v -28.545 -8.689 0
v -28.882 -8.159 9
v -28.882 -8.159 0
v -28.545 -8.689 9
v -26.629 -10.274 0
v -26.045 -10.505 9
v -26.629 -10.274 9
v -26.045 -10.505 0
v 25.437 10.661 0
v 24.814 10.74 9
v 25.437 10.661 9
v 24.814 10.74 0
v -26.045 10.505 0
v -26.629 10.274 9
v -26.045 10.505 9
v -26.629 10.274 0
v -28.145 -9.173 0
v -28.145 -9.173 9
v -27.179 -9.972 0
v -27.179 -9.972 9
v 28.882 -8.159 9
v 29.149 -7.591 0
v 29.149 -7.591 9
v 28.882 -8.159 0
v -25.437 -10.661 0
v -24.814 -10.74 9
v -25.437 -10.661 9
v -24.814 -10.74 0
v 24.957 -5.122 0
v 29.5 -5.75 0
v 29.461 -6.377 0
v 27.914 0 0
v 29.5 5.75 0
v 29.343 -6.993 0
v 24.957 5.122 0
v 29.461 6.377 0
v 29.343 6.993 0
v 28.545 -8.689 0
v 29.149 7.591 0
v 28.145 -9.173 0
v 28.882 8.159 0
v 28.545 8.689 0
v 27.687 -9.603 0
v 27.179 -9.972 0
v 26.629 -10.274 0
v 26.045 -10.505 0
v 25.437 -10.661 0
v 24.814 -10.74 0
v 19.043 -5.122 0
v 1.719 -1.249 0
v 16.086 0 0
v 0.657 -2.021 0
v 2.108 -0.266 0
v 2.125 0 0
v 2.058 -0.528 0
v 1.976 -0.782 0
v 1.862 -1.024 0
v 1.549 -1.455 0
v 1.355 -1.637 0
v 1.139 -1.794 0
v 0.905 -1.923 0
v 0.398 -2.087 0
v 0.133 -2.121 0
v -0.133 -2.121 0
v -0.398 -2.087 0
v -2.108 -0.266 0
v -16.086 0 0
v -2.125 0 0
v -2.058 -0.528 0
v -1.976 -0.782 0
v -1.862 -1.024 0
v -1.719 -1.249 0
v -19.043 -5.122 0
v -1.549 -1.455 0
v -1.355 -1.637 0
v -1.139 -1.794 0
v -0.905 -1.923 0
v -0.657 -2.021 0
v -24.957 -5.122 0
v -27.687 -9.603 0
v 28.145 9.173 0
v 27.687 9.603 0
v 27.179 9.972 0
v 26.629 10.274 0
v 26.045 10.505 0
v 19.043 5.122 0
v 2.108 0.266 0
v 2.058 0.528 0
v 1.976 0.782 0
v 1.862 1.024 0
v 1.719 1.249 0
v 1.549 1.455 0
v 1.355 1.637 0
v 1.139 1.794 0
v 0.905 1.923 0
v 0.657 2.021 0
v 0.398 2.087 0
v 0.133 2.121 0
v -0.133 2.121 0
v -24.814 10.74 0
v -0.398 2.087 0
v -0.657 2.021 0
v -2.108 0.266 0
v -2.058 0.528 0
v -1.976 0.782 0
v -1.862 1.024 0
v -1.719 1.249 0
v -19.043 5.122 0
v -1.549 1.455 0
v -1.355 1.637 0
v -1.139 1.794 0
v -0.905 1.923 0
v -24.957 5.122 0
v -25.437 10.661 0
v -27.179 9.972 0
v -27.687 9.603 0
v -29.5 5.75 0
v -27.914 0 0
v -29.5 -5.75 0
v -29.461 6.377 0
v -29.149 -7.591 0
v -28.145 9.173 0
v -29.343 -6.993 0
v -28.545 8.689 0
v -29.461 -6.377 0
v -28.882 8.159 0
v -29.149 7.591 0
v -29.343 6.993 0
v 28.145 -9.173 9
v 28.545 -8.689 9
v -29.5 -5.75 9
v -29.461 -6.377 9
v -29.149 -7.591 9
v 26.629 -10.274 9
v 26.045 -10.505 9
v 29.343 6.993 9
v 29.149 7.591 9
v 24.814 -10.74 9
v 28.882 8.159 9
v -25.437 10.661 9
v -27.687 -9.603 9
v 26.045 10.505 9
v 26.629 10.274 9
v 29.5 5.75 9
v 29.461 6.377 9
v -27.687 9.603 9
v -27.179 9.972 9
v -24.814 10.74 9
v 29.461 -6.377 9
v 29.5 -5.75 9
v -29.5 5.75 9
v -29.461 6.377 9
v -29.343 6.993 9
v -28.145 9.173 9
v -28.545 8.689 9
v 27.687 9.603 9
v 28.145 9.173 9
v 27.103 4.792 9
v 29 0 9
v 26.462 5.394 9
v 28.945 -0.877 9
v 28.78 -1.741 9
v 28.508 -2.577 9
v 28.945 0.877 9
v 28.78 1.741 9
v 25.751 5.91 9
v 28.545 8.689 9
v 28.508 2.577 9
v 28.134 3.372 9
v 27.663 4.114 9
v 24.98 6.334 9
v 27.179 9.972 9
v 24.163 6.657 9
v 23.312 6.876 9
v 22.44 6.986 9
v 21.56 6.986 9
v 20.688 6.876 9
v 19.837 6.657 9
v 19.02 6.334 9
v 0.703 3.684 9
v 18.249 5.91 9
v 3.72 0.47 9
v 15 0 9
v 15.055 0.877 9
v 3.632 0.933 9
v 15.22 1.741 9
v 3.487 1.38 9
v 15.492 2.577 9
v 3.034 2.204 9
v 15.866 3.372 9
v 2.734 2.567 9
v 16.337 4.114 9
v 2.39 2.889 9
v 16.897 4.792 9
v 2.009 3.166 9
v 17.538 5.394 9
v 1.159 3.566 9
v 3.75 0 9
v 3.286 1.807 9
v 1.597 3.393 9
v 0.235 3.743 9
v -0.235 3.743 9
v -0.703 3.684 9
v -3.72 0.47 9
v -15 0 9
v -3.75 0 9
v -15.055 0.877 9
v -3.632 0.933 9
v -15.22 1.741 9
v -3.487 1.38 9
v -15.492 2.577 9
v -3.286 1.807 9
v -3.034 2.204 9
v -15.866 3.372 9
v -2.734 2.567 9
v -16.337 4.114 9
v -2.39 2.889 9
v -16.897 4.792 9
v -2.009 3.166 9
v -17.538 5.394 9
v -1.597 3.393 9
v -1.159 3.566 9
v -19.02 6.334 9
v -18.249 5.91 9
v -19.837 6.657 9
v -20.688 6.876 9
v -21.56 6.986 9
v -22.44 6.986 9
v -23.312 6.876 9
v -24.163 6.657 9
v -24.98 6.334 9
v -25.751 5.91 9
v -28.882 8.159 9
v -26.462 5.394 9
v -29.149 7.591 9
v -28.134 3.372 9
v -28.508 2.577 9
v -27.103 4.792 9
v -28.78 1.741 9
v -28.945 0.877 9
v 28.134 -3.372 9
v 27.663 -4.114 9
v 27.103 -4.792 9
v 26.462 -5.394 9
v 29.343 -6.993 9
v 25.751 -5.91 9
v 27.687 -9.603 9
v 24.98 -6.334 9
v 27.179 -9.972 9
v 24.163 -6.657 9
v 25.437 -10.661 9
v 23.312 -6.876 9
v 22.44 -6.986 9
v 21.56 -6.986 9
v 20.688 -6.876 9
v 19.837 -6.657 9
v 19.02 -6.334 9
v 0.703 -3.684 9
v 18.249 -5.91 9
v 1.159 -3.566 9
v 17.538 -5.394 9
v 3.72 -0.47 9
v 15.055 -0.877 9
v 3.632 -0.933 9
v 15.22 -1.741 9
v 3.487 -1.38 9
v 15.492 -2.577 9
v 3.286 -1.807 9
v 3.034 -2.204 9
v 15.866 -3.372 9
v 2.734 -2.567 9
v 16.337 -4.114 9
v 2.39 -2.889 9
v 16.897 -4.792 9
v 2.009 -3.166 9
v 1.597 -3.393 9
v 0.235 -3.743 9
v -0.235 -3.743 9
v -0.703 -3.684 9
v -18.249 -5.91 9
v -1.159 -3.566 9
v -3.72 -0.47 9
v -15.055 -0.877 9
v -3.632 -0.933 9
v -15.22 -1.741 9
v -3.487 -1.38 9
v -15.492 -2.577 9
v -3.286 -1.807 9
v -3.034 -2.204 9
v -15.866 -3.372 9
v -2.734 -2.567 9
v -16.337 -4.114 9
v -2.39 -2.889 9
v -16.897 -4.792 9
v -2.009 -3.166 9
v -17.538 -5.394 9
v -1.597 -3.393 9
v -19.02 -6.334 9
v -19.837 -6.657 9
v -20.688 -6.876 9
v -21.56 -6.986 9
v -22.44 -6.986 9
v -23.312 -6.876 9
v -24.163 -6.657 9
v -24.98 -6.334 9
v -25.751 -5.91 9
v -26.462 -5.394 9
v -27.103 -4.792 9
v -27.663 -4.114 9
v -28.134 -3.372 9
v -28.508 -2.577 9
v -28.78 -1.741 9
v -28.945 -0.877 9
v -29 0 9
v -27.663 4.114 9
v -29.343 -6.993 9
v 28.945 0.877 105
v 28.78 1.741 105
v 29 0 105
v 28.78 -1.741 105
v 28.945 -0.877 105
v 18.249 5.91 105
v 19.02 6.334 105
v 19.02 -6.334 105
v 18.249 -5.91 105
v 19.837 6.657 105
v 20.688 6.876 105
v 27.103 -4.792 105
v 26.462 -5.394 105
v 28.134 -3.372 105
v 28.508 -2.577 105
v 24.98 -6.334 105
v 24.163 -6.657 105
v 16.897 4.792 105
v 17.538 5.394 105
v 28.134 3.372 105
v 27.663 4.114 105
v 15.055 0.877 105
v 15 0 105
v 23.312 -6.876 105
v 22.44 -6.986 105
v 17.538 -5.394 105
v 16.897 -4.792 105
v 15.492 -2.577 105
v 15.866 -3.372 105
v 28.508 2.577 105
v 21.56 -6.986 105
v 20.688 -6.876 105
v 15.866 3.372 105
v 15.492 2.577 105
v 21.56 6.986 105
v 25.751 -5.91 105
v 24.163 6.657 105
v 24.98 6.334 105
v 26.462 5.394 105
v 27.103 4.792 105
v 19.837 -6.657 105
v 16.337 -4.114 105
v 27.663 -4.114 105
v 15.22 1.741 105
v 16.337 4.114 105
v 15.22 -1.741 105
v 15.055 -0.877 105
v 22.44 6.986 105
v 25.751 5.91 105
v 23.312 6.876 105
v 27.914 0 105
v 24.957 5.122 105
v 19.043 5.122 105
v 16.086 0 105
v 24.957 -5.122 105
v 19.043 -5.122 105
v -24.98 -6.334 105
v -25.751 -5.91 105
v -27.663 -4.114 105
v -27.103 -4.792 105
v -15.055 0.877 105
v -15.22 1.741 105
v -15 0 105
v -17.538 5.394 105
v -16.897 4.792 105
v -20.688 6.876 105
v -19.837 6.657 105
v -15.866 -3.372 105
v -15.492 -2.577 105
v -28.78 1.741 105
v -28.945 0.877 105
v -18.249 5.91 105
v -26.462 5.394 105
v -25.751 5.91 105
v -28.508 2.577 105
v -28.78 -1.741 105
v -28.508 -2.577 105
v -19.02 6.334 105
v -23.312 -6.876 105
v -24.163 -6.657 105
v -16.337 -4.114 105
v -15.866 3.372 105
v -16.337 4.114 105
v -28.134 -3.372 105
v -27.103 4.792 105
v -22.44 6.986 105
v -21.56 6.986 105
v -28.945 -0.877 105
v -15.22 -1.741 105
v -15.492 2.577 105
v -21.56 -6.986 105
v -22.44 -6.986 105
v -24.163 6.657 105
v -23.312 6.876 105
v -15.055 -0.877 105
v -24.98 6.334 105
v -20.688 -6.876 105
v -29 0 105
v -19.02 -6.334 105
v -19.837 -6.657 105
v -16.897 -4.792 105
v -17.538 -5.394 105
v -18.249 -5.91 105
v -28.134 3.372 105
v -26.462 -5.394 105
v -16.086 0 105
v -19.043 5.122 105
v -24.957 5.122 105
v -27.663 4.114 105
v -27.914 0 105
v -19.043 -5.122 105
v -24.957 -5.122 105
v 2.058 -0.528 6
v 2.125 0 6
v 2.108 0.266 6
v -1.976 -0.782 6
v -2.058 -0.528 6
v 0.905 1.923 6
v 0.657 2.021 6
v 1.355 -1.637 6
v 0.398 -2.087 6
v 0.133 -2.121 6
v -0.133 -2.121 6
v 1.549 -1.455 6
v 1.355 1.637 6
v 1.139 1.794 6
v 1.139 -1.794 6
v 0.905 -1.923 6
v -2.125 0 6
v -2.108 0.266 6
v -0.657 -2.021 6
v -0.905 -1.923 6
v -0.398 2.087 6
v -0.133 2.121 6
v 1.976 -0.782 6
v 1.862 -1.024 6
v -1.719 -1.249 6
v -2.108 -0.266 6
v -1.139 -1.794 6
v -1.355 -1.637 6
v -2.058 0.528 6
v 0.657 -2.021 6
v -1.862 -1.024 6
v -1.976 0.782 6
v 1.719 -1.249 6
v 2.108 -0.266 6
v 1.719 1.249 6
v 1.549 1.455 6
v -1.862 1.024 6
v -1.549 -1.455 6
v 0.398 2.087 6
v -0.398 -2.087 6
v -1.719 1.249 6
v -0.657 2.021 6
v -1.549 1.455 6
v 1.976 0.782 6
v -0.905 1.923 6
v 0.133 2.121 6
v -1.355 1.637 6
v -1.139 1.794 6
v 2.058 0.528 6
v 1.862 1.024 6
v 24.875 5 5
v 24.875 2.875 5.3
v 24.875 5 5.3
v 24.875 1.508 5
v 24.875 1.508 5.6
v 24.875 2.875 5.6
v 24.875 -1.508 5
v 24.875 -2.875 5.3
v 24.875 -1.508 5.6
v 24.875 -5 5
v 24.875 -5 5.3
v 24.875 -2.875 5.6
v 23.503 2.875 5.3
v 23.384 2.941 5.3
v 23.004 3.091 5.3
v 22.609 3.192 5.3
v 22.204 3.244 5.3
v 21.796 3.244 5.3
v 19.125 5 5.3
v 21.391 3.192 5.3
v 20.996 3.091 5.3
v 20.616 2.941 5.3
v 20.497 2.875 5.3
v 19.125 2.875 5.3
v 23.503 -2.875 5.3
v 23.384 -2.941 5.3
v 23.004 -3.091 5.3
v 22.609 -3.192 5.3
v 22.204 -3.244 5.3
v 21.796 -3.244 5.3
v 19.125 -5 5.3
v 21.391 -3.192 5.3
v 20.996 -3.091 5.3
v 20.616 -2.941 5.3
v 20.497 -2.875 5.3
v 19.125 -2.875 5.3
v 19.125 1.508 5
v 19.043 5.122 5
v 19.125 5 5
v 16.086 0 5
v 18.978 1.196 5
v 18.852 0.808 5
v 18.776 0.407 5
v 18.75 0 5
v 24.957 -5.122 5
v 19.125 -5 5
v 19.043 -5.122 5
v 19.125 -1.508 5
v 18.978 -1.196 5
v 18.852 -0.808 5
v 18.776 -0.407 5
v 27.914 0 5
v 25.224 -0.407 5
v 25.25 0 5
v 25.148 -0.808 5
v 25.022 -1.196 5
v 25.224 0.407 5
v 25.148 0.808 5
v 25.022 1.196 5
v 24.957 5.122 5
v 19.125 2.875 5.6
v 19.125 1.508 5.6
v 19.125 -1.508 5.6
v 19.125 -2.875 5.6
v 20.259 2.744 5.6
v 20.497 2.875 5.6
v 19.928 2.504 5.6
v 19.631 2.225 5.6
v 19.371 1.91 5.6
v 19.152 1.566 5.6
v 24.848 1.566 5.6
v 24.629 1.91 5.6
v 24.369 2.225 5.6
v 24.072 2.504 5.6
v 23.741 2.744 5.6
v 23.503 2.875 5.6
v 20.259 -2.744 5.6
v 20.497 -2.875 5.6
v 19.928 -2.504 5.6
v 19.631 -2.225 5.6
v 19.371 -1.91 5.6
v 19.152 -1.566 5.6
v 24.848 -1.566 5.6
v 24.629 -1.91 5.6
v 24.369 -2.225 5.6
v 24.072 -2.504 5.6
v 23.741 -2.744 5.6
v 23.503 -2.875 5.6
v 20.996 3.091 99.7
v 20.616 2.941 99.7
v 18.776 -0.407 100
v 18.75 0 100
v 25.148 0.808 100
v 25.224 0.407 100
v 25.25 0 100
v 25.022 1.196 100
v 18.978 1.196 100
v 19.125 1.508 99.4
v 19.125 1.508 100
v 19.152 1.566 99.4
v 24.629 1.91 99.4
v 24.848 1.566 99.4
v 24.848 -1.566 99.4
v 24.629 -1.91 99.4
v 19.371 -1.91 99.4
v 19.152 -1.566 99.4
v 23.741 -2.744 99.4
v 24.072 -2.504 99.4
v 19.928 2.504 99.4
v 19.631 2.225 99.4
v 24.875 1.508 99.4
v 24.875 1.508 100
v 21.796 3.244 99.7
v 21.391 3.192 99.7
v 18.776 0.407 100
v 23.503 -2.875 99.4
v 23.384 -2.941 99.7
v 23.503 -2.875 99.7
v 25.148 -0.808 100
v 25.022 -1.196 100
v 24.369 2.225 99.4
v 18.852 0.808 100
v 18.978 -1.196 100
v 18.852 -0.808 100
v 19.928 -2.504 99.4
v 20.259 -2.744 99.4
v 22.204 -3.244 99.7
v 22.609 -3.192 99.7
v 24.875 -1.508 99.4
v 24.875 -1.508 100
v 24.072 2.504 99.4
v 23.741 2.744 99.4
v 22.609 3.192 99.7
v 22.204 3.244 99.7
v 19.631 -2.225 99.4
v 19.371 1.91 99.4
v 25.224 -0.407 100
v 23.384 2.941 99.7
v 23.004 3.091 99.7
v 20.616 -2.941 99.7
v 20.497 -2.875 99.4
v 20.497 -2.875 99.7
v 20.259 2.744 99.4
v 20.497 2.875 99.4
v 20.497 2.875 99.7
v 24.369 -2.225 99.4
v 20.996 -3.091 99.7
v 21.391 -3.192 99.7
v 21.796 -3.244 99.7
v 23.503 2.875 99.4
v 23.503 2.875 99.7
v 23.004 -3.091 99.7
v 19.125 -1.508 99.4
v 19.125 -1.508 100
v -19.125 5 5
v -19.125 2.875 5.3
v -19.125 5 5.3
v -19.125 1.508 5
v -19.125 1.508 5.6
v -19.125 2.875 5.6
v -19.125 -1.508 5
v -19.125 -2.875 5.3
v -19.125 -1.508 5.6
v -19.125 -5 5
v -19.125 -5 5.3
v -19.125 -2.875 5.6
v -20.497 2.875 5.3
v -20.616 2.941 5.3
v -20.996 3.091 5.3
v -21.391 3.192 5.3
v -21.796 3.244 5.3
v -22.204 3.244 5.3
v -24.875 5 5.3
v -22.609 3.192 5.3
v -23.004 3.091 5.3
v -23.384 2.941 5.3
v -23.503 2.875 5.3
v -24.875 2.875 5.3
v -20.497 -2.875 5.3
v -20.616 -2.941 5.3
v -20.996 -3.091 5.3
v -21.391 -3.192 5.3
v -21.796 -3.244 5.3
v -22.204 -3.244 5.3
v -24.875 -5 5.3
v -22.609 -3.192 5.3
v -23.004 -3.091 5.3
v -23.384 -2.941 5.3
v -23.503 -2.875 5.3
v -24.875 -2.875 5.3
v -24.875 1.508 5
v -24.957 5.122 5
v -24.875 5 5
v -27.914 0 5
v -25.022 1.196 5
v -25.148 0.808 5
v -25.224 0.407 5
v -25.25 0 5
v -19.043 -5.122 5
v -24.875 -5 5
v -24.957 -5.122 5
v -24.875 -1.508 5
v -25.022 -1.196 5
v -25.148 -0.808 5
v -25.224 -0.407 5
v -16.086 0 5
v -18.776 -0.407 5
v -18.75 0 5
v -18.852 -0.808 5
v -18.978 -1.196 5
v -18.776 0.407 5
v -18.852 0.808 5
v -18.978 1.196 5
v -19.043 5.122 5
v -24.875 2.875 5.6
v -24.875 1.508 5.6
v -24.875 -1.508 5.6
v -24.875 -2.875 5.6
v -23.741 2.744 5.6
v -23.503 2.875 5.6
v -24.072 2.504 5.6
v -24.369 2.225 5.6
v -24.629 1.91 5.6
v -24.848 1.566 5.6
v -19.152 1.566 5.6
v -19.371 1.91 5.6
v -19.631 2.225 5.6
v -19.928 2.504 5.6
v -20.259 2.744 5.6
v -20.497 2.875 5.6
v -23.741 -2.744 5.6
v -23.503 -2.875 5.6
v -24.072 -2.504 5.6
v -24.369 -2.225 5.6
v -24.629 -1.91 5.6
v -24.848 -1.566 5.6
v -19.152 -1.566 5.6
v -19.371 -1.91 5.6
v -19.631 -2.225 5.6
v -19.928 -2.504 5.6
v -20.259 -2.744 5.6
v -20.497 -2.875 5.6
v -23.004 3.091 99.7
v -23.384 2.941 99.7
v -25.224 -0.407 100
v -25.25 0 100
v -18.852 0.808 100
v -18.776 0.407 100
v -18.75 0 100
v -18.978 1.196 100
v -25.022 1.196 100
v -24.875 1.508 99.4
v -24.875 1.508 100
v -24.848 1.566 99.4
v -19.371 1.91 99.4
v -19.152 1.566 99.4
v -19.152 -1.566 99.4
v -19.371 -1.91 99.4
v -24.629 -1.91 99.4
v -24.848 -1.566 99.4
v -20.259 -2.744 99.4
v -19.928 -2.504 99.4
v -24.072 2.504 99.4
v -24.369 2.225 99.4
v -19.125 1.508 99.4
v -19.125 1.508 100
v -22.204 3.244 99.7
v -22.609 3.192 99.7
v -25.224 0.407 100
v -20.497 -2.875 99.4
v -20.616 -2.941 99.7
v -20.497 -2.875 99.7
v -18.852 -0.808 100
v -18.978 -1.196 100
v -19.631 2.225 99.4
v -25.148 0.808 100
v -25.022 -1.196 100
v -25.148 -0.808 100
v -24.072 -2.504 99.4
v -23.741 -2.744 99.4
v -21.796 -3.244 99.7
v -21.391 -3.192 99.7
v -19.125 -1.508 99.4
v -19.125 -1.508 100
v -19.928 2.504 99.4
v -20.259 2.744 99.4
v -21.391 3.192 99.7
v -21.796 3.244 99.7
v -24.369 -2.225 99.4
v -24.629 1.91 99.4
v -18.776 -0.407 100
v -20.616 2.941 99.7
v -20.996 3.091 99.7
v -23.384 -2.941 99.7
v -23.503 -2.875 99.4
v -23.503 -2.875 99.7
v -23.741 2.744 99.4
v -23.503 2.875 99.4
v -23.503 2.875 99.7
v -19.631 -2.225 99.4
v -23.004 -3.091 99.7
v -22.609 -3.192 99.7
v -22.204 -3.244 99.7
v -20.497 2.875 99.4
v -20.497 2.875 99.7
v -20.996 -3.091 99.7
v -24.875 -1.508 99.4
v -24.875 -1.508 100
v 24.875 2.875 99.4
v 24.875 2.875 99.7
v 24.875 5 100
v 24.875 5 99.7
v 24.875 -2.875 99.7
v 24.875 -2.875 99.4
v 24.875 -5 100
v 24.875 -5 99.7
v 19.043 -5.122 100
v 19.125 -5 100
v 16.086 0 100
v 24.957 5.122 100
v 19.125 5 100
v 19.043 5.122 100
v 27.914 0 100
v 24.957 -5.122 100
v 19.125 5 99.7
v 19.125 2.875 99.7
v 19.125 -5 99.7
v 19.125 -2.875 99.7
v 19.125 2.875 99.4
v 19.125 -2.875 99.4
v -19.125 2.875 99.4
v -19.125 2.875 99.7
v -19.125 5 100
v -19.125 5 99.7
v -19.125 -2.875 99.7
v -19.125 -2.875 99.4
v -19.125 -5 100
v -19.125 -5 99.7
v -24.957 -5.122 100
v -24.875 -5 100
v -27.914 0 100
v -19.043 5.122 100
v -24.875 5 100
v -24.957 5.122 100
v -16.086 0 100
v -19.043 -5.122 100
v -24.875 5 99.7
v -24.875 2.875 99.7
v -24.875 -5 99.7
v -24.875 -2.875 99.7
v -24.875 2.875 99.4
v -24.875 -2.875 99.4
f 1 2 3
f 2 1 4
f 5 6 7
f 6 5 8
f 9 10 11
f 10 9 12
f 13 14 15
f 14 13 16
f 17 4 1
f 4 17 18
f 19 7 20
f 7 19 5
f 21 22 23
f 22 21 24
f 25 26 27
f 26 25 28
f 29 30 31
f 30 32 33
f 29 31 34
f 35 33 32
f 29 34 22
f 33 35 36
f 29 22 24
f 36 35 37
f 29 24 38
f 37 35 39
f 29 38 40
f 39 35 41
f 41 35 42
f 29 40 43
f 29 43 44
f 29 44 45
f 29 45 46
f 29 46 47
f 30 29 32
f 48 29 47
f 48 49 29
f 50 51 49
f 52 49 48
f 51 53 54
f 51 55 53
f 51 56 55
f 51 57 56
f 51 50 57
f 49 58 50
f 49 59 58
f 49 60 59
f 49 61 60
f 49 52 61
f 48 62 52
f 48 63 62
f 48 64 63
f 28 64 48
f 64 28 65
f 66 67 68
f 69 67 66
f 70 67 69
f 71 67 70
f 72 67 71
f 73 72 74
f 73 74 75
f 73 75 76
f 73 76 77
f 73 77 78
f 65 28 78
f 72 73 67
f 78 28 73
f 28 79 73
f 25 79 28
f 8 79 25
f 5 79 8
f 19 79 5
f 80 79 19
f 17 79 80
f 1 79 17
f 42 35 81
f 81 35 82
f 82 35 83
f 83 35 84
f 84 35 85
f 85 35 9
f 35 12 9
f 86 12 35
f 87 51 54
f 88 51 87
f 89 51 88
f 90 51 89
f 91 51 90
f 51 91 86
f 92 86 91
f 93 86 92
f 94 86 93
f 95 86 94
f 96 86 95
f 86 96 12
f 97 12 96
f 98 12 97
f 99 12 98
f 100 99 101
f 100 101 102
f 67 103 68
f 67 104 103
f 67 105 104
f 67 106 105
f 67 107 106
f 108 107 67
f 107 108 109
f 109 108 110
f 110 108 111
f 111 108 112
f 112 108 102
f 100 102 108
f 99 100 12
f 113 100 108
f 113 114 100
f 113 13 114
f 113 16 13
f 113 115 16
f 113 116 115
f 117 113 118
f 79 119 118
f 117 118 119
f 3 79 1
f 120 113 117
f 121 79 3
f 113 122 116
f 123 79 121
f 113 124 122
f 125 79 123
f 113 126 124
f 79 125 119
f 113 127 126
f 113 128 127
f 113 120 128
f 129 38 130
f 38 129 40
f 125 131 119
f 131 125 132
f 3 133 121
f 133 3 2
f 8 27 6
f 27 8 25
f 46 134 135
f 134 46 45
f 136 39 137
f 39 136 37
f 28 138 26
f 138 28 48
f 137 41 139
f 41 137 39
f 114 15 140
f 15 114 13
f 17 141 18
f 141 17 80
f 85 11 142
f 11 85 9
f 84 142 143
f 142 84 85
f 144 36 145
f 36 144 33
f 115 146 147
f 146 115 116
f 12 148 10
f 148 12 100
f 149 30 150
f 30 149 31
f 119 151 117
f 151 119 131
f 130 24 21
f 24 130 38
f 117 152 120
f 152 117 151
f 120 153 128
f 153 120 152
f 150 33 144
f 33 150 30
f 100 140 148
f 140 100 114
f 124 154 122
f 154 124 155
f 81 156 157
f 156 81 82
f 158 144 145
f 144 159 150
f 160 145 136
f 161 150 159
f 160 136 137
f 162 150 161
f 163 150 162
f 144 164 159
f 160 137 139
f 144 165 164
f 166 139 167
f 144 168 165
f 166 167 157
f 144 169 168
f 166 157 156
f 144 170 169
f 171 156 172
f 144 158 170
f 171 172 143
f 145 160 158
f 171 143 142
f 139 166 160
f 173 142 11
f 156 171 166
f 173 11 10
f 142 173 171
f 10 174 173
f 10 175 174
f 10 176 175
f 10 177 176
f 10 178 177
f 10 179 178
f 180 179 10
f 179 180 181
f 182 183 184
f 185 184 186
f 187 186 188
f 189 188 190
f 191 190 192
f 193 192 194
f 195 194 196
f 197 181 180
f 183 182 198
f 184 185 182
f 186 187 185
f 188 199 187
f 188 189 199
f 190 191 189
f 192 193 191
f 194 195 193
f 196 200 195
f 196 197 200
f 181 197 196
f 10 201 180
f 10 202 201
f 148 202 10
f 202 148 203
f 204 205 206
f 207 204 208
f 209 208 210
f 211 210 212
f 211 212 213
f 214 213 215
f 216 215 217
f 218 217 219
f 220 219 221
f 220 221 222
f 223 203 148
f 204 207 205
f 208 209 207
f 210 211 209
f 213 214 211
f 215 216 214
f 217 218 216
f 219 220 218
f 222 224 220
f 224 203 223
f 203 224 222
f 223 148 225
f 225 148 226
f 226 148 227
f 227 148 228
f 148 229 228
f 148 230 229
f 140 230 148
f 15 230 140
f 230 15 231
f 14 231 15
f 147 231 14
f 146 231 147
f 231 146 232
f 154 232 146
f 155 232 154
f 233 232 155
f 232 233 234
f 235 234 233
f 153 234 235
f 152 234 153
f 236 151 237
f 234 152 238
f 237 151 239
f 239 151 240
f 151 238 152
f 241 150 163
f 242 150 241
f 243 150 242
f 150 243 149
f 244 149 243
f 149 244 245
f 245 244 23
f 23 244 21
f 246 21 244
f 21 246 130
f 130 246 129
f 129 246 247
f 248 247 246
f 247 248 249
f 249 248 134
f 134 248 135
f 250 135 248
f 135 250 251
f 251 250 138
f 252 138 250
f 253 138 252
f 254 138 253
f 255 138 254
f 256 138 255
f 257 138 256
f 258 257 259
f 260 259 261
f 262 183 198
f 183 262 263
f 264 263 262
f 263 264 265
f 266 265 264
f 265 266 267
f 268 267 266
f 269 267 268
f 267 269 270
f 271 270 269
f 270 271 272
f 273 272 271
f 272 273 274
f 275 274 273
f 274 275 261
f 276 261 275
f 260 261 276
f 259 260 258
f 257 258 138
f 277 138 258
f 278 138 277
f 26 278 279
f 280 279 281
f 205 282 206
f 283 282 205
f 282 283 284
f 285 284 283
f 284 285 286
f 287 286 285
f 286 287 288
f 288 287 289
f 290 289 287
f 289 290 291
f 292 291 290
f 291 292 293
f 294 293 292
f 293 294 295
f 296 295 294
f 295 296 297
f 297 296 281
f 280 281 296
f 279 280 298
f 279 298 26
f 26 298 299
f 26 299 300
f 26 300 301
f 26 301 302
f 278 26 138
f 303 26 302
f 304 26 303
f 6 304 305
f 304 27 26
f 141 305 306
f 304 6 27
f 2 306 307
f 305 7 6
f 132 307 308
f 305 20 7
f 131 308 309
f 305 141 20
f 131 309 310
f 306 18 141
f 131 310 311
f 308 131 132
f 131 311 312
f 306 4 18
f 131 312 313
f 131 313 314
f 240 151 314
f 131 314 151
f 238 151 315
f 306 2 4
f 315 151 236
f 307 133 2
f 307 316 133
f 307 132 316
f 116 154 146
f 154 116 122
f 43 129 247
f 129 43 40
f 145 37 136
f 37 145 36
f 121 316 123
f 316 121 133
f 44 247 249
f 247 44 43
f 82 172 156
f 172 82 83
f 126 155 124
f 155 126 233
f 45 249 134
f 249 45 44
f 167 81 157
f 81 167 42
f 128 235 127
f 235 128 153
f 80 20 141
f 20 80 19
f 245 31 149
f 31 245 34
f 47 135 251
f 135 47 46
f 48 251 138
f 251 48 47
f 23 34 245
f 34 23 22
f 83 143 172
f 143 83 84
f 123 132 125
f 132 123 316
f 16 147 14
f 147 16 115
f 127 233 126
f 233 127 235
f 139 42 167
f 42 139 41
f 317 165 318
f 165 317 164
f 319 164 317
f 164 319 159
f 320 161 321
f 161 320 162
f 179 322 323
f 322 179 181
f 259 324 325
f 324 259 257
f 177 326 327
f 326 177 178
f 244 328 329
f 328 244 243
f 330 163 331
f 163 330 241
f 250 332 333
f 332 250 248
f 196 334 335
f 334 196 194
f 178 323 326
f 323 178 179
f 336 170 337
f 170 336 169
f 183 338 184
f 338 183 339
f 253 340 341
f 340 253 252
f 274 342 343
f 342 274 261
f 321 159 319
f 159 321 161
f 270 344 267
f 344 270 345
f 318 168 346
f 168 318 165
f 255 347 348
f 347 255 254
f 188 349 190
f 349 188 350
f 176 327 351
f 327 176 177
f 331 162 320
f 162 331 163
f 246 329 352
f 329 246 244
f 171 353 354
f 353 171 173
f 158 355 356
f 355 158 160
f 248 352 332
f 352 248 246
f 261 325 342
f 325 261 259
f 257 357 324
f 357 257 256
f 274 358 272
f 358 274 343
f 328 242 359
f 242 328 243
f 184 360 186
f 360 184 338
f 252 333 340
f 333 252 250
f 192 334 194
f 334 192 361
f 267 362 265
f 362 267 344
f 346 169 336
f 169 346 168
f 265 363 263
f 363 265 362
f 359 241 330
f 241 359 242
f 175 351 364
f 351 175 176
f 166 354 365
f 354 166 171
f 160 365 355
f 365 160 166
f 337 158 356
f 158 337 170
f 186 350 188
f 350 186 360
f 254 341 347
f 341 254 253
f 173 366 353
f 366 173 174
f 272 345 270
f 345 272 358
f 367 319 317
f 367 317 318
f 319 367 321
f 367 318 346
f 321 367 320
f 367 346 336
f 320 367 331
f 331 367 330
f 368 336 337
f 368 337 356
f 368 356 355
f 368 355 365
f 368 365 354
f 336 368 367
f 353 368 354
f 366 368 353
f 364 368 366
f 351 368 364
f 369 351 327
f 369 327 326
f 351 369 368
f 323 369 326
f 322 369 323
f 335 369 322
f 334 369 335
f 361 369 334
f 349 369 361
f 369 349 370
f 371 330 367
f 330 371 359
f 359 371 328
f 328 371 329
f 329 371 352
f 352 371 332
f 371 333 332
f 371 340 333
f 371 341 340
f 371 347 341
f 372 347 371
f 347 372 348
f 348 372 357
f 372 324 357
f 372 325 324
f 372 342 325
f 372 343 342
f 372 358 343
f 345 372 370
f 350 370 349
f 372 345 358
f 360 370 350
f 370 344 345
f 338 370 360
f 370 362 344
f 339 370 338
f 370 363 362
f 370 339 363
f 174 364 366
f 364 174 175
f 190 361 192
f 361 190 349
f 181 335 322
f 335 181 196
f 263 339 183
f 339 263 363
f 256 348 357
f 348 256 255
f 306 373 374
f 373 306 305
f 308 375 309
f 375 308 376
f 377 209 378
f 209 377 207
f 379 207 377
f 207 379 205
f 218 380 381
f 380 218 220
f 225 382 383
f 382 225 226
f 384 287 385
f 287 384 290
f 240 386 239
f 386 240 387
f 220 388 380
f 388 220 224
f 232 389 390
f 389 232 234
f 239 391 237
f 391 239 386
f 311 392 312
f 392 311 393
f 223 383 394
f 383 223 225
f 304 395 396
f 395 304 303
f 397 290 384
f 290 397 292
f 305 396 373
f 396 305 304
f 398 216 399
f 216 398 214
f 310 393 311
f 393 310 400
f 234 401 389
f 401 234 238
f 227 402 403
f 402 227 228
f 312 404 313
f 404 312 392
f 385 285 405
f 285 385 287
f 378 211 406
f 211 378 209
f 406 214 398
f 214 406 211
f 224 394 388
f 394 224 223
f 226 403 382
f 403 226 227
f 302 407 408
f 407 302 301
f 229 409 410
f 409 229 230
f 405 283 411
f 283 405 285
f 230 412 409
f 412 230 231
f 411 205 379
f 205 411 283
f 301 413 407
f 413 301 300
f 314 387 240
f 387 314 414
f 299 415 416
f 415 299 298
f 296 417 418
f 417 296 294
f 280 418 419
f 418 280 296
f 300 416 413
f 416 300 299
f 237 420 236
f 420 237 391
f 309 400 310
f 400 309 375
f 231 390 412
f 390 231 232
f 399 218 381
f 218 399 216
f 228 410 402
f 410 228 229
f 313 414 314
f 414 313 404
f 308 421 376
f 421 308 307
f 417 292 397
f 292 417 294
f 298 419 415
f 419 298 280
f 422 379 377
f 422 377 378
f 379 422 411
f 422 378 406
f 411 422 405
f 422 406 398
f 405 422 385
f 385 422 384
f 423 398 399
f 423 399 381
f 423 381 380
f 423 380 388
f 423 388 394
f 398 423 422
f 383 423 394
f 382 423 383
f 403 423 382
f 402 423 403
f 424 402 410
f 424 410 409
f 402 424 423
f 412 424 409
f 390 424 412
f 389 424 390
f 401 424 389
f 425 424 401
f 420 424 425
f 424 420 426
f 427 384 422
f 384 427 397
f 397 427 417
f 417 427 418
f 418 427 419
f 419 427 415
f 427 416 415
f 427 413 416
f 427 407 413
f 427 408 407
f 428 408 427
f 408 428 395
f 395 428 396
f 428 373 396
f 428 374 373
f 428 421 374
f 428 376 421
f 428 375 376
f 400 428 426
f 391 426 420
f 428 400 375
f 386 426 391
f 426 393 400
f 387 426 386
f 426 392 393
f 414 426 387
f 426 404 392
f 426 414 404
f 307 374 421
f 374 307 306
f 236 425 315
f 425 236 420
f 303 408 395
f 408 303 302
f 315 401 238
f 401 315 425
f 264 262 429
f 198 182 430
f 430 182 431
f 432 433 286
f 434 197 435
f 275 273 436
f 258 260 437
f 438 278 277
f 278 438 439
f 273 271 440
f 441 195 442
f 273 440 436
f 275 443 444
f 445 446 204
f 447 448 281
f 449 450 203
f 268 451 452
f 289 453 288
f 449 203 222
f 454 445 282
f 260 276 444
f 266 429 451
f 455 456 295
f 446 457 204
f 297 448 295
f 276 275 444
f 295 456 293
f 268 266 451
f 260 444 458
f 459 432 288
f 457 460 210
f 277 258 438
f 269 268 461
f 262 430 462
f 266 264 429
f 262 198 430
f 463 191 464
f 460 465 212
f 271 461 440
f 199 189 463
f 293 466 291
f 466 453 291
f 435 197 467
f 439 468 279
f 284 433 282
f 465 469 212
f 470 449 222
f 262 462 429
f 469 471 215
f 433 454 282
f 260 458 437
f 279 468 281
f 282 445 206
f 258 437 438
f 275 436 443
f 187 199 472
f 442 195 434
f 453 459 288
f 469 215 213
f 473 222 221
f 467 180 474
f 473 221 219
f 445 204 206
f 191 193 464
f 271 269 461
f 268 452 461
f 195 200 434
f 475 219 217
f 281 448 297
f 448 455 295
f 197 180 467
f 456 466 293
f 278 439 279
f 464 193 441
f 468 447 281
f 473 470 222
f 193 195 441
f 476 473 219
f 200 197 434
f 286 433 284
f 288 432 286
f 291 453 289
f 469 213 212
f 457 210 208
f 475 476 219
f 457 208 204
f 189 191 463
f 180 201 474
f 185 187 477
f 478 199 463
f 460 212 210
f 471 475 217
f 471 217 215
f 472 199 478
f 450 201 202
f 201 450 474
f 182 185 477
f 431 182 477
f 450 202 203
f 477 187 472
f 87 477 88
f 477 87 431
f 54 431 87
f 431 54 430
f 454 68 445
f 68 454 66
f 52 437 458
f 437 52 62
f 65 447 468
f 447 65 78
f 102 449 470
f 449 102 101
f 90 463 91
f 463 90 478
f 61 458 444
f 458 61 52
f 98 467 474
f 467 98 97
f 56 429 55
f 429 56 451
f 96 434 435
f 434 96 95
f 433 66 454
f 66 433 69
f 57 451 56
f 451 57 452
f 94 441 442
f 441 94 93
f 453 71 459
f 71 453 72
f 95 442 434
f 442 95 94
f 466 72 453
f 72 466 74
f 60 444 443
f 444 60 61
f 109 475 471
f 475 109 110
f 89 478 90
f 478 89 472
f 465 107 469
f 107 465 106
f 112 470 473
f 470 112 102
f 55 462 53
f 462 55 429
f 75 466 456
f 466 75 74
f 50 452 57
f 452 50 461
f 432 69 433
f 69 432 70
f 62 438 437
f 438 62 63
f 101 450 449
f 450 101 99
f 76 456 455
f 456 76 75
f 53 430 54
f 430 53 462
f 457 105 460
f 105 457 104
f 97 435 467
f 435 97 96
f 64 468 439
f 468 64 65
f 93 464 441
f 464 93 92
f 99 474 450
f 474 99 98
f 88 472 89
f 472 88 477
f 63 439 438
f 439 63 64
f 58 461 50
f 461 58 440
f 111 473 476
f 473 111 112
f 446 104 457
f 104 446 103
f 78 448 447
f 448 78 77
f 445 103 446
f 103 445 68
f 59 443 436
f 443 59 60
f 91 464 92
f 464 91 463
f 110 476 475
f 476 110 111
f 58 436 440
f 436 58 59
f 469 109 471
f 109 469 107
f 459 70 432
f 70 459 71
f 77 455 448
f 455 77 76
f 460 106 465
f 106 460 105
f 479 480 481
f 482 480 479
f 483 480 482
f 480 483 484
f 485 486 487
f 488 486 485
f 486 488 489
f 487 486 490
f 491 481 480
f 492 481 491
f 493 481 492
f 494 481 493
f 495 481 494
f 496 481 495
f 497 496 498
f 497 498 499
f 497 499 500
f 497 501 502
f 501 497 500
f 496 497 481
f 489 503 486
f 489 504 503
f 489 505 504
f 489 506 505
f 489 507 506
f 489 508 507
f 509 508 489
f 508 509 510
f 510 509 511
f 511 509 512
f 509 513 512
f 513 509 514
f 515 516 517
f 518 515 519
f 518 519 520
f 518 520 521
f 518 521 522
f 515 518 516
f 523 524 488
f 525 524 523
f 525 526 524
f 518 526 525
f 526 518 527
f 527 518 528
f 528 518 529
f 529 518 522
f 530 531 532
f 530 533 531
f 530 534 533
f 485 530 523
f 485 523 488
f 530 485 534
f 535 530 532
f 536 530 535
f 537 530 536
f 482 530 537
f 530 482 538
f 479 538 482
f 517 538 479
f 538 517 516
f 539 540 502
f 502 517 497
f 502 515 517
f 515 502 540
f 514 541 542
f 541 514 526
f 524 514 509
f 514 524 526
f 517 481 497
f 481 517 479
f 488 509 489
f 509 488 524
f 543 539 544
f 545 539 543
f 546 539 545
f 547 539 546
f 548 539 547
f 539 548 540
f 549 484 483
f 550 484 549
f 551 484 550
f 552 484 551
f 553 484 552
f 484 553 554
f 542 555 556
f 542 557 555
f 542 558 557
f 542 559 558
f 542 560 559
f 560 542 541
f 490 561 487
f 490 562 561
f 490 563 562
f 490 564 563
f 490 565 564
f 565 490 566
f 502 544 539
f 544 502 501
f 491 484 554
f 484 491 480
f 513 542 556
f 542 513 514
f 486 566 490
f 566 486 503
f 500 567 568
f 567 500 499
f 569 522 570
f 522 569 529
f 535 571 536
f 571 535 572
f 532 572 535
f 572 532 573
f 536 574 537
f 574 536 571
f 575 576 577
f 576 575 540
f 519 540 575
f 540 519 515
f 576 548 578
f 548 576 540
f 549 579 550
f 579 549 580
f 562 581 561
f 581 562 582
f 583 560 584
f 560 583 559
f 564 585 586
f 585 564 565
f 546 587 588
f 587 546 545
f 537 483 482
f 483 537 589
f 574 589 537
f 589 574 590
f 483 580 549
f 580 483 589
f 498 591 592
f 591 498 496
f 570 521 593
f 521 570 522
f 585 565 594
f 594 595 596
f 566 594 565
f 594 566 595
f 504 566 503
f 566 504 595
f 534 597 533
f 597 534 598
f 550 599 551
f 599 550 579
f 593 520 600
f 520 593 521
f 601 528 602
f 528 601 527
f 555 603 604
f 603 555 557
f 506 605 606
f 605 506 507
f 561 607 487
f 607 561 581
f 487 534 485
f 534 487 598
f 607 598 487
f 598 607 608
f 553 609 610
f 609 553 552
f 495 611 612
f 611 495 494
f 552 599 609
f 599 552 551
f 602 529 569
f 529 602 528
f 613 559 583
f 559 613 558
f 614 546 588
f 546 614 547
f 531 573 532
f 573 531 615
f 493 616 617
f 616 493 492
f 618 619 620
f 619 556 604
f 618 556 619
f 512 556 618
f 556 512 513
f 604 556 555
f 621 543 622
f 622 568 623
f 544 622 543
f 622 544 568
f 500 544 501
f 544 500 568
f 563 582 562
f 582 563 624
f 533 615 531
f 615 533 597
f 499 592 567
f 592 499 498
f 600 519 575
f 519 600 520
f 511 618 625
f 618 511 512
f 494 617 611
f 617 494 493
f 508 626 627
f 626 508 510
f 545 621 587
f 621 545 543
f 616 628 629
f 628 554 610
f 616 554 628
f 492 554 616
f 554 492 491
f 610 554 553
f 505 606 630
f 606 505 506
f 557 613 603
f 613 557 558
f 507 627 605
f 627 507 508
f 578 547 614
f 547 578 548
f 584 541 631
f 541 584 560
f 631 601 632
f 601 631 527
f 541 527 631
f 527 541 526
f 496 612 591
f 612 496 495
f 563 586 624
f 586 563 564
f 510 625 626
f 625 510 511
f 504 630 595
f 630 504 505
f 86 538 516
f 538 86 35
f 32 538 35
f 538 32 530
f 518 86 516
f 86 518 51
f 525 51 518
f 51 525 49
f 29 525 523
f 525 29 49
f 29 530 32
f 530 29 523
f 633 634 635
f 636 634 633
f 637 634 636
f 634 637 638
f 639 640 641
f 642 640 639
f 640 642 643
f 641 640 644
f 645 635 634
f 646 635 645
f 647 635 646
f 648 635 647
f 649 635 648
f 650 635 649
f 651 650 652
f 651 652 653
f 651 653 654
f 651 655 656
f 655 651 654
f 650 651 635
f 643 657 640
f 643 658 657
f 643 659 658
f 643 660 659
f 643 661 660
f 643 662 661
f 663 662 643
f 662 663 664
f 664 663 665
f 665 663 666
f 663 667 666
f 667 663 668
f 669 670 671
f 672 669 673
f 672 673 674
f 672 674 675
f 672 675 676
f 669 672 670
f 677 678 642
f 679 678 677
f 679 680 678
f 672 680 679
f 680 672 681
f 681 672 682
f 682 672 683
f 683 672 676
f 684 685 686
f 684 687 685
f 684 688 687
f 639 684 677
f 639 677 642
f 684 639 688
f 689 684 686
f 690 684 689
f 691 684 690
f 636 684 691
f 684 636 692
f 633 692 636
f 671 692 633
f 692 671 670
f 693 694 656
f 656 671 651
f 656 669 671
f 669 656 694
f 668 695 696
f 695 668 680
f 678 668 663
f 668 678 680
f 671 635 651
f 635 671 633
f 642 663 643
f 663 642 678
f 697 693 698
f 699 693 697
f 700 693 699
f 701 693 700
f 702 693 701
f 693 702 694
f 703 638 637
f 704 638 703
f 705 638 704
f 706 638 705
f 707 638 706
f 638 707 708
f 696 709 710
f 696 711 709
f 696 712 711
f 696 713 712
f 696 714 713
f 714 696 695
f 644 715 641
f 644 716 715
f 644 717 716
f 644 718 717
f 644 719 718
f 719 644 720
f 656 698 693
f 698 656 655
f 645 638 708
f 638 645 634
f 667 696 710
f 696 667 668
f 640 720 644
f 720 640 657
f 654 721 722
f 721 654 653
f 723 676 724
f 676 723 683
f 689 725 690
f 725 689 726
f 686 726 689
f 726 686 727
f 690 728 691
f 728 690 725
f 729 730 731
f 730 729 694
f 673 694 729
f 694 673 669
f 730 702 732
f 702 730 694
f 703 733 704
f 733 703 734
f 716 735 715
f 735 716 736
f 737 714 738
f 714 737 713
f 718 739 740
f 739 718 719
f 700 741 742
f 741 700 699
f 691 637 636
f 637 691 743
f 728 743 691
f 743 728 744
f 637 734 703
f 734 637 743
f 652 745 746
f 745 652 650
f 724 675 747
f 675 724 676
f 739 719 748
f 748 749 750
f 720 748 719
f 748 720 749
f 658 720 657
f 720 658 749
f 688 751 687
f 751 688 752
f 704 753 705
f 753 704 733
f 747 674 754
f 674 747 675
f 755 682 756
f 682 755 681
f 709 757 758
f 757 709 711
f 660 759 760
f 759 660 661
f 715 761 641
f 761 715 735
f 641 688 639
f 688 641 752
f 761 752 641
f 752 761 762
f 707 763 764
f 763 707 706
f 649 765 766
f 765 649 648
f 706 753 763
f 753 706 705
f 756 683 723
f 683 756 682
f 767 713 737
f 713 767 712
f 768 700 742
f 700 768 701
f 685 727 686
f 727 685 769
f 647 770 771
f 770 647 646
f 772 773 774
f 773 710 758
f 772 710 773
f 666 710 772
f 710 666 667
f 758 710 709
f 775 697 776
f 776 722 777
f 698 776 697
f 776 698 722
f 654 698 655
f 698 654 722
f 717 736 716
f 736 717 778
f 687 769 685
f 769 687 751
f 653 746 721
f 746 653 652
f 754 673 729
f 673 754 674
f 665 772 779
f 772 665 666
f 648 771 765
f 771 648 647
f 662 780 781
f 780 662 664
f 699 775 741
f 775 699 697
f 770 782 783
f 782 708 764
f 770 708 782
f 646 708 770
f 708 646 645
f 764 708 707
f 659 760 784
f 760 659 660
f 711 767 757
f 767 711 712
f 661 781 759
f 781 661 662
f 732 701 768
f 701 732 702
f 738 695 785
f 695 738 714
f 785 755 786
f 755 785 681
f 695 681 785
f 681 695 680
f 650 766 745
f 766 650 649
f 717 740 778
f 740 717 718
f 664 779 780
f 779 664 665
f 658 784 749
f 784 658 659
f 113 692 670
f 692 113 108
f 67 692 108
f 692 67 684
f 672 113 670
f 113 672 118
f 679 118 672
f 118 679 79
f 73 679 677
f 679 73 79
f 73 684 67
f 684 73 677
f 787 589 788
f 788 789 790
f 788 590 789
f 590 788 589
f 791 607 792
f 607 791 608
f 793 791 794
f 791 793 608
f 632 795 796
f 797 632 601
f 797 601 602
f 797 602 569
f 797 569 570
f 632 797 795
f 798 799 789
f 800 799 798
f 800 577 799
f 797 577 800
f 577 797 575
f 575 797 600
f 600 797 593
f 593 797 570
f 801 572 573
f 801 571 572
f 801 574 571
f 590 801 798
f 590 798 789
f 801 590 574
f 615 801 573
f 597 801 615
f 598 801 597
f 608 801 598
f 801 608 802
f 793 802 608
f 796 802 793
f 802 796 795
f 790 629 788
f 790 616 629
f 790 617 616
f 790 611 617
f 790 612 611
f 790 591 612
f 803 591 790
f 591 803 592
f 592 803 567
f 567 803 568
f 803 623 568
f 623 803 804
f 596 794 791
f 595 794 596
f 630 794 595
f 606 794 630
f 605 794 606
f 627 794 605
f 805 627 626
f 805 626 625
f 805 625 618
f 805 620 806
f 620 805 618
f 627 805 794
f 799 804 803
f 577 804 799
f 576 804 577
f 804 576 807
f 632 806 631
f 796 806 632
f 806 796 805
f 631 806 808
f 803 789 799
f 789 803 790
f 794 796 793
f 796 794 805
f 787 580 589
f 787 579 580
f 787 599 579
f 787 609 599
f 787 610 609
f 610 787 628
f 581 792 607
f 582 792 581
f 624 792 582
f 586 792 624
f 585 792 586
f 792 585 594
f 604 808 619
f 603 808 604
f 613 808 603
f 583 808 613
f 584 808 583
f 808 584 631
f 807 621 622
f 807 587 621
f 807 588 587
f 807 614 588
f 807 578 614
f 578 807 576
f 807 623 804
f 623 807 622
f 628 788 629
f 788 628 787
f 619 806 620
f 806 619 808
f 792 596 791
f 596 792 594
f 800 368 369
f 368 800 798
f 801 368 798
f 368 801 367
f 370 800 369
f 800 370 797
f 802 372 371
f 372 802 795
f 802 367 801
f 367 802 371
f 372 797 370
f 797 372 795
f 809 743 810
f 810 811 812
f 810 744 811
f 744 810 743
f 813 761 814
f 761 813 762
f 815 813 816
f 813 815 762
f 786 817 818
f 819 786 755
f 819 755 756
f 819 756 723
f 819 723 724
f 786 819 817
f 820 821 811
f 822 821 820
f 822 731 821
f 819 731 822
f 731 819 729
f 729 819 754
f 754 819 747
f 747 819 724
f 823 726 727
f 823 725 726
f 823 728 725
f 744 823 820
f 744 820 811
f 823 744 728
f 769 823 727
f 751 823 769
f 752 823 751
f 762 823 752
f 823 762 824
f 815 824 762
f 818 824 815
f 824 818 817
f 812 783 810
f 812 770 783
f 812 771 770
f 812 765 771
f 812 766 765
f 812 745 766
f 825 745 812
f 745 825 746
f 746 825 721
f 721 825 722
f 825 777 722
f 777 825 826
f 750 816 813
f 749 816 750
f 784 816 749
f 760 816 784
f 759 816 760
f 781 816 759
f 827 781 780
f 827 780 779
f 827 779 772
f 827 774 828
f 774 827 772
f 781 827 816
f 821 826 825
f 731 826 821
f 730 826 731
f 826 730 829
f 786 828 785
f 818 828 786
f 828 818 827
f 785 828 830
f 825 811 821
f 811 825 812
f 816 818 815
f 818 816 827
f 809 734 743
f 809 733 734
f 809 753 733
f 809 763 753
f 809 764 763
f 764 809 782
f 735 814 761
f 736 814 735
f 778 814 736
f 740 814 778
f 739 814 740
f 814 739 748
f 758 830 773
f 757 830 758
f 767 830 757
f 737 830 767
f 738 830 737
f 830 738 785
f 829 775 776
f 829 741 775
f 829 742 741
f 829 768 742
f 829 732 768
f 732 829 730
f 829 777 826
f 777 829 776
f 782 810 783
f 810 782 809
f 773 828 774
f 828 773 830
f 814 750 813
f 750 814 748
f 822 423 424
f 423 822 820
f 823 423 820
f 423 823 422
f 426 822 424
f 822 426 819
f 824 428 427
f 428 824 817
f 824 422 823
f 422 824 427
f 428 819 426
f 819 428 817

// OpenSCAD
$fn = 50;


difference() {
	union() {
		hull() {
			translate(v = [-24.5000000000, 5.7500000000, 0]) {
				cylinder(h = 9, r = 5);
			}
			translate(v = [24.5000000000, 5.7500000000, 0]) {
				cylinder(h = 9, r = 5);
			}
			translate(v = [-24.5000000000, -5.7500000000, 0]) {
				cylinder(h = 9, r = 5);
			}
			translate(v = [24.5000000000, -5.7500000000, 0]) {
				cylinder(h = 9, r = 5);
			}
		}
		translate(v = [22.0000000000, 0, 0.0000000000]) {
			cylinder(h = 105, r = 7.0000000000);
		}
		translate(v = [-22.0000000000, 0, 0.0000000000]) {
			cylinder(h = 105, r = 7.0000000000);
		}
		translate(v = [22.0000000000, 0, 99.0000000000]) {
			cylinder(h = 6, r = 7.0000000000);
		}
		translate(v = [-22.0000000000, 0, 99.0000000000]) {
			cylinder(h = 6, r = 7.0000000000);
		}
	}
	union() {
		translate(v = [0, 0, 9]) {
			rotate(a = [0, 0, 0]) {
				difference() {
					union() {
						#translate(v = [0, 0, -100.0000000000]) {
							cylinder(h = 100, r = 2.0000000000);
						}
						#translate(v = [0, 0, -3]) {
							cylinder(h = 3, r1 = 2.1250000000, r2 = 3.7500000000);
						}
						#translate(v = [0, 0, -100.0000000000]) {
							cylinder(h = 100, r = 2.1250000000);
						}
						#translate(v = [0, 0, -100.0000000000]) {
							cylinder(h = 100, r = 2.0000000000);
						}
					}
					union();
				}
			}
		}
		translate(v = [22.0000000000, 0, 0]) {
			rotate(a = [0, 0, 0]) {
				difference() {
					union() {
						#translate(v = [-2.8750000000, -5.0000000000, -0.3000000000]) {
							cube(size = [5.7500000000, 10, 0.3000000000]);
						}
						#translate(v = [-2.8750000000, -2.8750000000, -0.6000000000]) {
							cube(size = [5.7500000000, 5.7500000000, 0.3000000000]);
						}
						#translate(v = [-2.8750000000, -5.0000000000, 5]) {
							cube(size = [5.7500000000, 10, 0.3000000000]);
						}
						#translate(v = [-2.8750000000, -2.8750000000, 5.3000000000]) {
							cube(size = [5.7500000000, 5.7500000000, 0.3000000000]);
						}
						#translate(v = [0, 0, -100.0000000000]) {
							cylinder(h = 200, r = 3.2500000000);
						}
						#linear_extrude(height = 5) {
							polygon(points = [[5.9142500000, 0.0000000000], [2.9571250000, 5.1218907443], [-2.9571250000, 5.1218907443], [-5.9142500000, 0.0000000000], [-2.9571250000, -5.1218907443], [2.9571250000, -5.1218907443]]);
						}
						#translate(v = [-2.8750000000, -5.0000000000, -0.3000000000]) {
							cube(size = [5.7500000000, 10, 0.3000000000]);
						}
						#translate(v = [-2.8750000000, -2.8750000000, -0.6000000000]) {
							cube(size = [5.7500000000, 5.7500000000, 0.3000000000]);
						}
						#translate(v = [-2.8750000000, -5.0000000000, 5]) {
							cube(size = [5.7500000000, 10, 0.3000000000]);
						}
						#translate(v = [-2.8750000000, -2.8750000000, 5.3000000000]) {
							cube(size = [5.7500000000, 5.7500000000, 0.3000000000]);
						}
						#translate(v = [0, 0, -100.0000000000]) {
							cylinder(h = 200, r = 3.2500000000);
						}
						#translate(v = [-2.8750000000, -5.0000000000, -0.3000000000]) {
							cube(size = [5.7500000000, 10, 0.3000000000]);
						}
						#translate(v = [-2.8750000000, -2.8750000000, -0.6000000000]) {
							cube(size = [5.7500000000, 5.7500000000, 0.3000000000]);
						}
						#translate(v = [-2.8750000000, -5.0000000000, 5]) {
							cube(size = [5.7500000000, 10, 0.3000000000]);
						}
						#translate(v = [-2.8750000000, -2.8750000000, 5.3000000000]) {
							cube(size = [5.7500000000, 5.7500000000, 0.3000000000]);
						}
						#translate(v = [0, 0, -100.0000000000]) {
							cylinder(h = 200, r = 3.2500000000);
						}
					}
					union();
				}
			}
		}
		translate(v = [-22.0000000000, 0, 0]) {
			rotate(a = [0, 0, 0]) {
				difference() {
					union() {
						#translate(v = [-2.8750000000, -5.0000000000, -0.3000000000]) {
							cube(size = [5.7500000000, 10, 0.3000000000]);
						}
						#translate(v = [-2.8750000000, -2.8750000000, -0.6000000000]) {
							cube(size = [5.7500000000, 5.7500000000, 0.3000000000]);
						}
						#translate(v = [-2.8750000000, -5.0000000000, 5]) {
							cube(size = [5.7500000000, 10, 0.3000000000]);
						}
						#translate(v = [-2.8750000000, -2.8750000000, 5.3000000000]) {
							cube(size = [5.7500000000, 5.7500000000, 0.3000000000]);
						}
						#translate(v = [0, 0, -100.0000000000]) {
							cylinder(h = 200, r = 3.2500000000);
						}
						#linear_extrude(height = 5) {
							polygon(points = [[5.9142500000, 0.0000000000], [2.9571250000, 5.1218907443], [-2.9571250000, 5.1218907443], [-5.9142500000, 0.0000000000], [-2.9571250000, -5.1218907443], [2.9571250000, -5.1218907443]]);
						}
						#translate(v = [-2.8750000000, -5.0000000000, -0.3000000000]) {
							cube(size = [5.7500000000, 10, 0.3000000000]);
						}
						#translate(v = [-2.8750000000, -2.8750000000, -0.6000000000]) {
							cube(size = [5.7500000000, 5.7500000000, 0.3000000000]);
						}
						#translate(v = [-2.8750000000, -5.0000000000, 5]) {
							cube(size = [5.7500000000, 10, 0.3000000000]);
						}
						#translate(v = [-2.8750000000, -2.8750000000, 5.3000000000]) {
							cube(size = [5.7500000000, 5.7500000000, 0.3000000000]);
						}
						#translate(v = [0, 0, -100.0000000000]) {
							cylinder(h = 200, r = 3.2500000000);
						}
						#translate(v = [-2.8750000000, -5.0000000000, -0.3000000000]) {
							cube(size = [5.7500000000, 10, 0.3000000000]);
						}
						#translate(v = [-2.8750000000, -2.8750000000, -0.6000000000]) {
							cube(size = [5.7500000000, 5.7500000000, 0.3000000000]);
						}
						#translate(v = [-2.8750000000, -5.0000000000, 5]) {
							cube(size = [5.7500000000, 10, 0.3000000000]);
						}
						#translate(v = [-2.8750000000, -2.8750000000, 5.3000000000]) {
							cube(size = [5.7500000000, 5.7500000000, 0.3000000000]);
						}
						#translate(v = [0, 0, -100.0000000000]) {
							cylinder(h = 200, r = 3.2500000000);
						}
					}
					union();
				}
			}
		}
		translate(v = [22.0000000000, 0, 105]) {
			rotate(a = [0, 0, 0]) {
				difference() {
					union() {
						#translate(v = [-2.8750000000, -5.0000000000, -5.3000000000]) {
							cube(size = [5.7500000000, 10, 0.3000000000]);
						}
						#translate(v = [-2.8750000000, -2.8750000000, -5.6000000000]) {
							cube(size = [5.7500000000, 5.7500000000, 0.3000000000]);
						}
						#translate(v = [-2.8750000000, -5.0000000000, 0]) {
							cube(size = [5.7500000000, 10, 0.3000000000]);
						}
						#translate(v = [-2.8750000000, -2.8750000000, 0.3000000000]) {
							cube(size = [5.7500000000, 5.7500000000, 0.3000000000]);
						}
						#translate(v = [0, 0, -100.0000000000]) {
							cylinder(h = 200, r = 3.2500000000);
						}
						translate(v = [0, 0, -5]) {
							#linear_extrude(height = 5) {
								polygon(points = [[5.9142500000, 0.0000000000], [2.9571250000, 5.1218907443], [-2.9571250000, 5.1218907443], [-5.9142500000, 0.0000000000], [-2.9571250000, -5.1218907443], [2.9571250000, -5.1218907443]]);
							}
						}
						#translate(v = [-2.8750000000, -5.0000000000, -5.3000000000]) {
							cube(size = [5.7500000000, 10, 0.3000000000]);
						}
						#translate(v = [-2.8750000000, -2.8750000000, -5.6000000000]) {
							cube(size = [5.7500000000, 5.7500000000, 0.3000000000]);
						}
						#translate(v = [-2.8750000000, -5.0000000000, 0]) {
							cube(size = [5.7500000000, 10, 0.3000000000]);
						}
						#translate(v = [-2.8750000000, -2.8750000000, 0.3000000000]) {
							cube(size = [5.7500000000, 5.7500000000, 0.3000000000]);
						}
						#translate(v = [0, 0, -100.0000000000]) {
							cylinder(h = 200, r = 3.2500000000);
						}
						#translate(v = [-2.8750000000, -5.0000000000, -5.3000000000]) {
							cube(size = [5.7500000000, 10, 0.3000000000]);
						}
						#translate(v = [-2.8750000000, -2.8750000000, -5.6000000000]) {
							cube(size = [5.7500000000, 5.7500000000, 0.3000000000]);
						}
						#translate(v = [-2.8750000000, -5.0000000000, 0]) {
							cube(size = [5.7500000000, 10, 0.3000000000]);
						}
						#translate(v = [-2.8750000000, -2.8750000000, 0.3000000000]) {
							cube(size = [5.7500000000, 5.7500000000, 0.3000000000]);
						}
						#translate(v = [0, 0, -100.0000000000]) {
							cylinder(h = 200, r = 3.2500000000);
						}
					}
					union();
				}
			}
		}
		translate(v = [-22.0000000000, 0, 105]) {
			rotate(a = [0, 0, 0]) {
				difference() {
					union() {
						#translate(v = [-2.8750000000, -5.0000000000, -5.3000000000]) {
							cube(size = [5.7500000000, 10, 0.3000000000]);
						}
						#translate(v = [-2.8750000000, -2.8750000000, -5.6000000000]) {
							cube(size = [5.7500000000, 5.7500000000, 0.3000000000]);
						}
						#translate(v = [-2.8750000000, -5.0000000000, 0]) {
							cube(size = [5.7500000000, 10, 0.3000000000]);
						}
						#translate(v = [-2.8750000000, -2.8750000000, 0.3000000000]) {
							cube(size = [5.7500000000, 5.7500000000, 0.3000000000]);
						}
						#translate(v = [0, 0, -100.0000000000]) {
							cylinder(h = 200, r = 3.2500000000);
						}
						translate(v = [0, 0, -5]) {
							#linear_extrude(height = 5) {
								polygon(points = [[5.9142500000, 0.0000000000], [2.9571250000, 5.1218907443], [-2.9571250000, 5.1218907443], [-5.9142500000, 0.0000000000], [-2.9571250000, -5.1218907443], [2.9571250000, -5.1218907443]]);
							}
						}
						#translate(v = [-2.8750000000, -5.0000000000, -5.3000000000]) {
							cube(size = [5.7500000000, 10, 0.3000000000]);
						}
						#translate(v = [-2.8750000000, -2.8750000000, -5.6000000000]) {
							cube(size = [5.7500000000, 5.7500000000, 0.3000000000]);
						}
						#translate(v = [-2.8750000000, -5.0000000000, 0]) {
							cube(size = [5.7500000000, 10, 0.3000000000]);
						}
						#translate(v = [-2.8750000000, -2.8750000000, 0.3000000000]) {
							cube(size = [5.7500000000, 5.7500000000, 0.3000000000]);
						}
						#translate(v = [0, 0, -100.0000000000]) {
							cylinder(h = 200, r = 3.2500000000);
						}
						#translate(v = [-2.8750000000, -5.0000000000, -5.3000000000]) {
							cube(size = [5.7500000000, 10, 0.3000000000]);
						}
						#translate(v = [-2.8750000000, -2.8750000000, -5.6000000000]) {
							cube(size = [5.7500000000, 5.7500000000, 0.3000000000]);
						}
						#translate(v = [-2.8750000000, -5.0000000000, 0]) {
							cube(size = [5.7500000000, 10, 0.3000000000]);
						}
						#translate(v = [-2.8750000000, -2.8750000000, 0.3000000000]) {
							cube(size = [5.7500000000, 5.7500000000, 0.3000000000]);
						}
						#translate(v = [0, 0, -100.0000000000]) {
							cylinder(h = 200, r = 3.2500000000);
						}
					}
					union();
				}
			}
		}
	}
}
